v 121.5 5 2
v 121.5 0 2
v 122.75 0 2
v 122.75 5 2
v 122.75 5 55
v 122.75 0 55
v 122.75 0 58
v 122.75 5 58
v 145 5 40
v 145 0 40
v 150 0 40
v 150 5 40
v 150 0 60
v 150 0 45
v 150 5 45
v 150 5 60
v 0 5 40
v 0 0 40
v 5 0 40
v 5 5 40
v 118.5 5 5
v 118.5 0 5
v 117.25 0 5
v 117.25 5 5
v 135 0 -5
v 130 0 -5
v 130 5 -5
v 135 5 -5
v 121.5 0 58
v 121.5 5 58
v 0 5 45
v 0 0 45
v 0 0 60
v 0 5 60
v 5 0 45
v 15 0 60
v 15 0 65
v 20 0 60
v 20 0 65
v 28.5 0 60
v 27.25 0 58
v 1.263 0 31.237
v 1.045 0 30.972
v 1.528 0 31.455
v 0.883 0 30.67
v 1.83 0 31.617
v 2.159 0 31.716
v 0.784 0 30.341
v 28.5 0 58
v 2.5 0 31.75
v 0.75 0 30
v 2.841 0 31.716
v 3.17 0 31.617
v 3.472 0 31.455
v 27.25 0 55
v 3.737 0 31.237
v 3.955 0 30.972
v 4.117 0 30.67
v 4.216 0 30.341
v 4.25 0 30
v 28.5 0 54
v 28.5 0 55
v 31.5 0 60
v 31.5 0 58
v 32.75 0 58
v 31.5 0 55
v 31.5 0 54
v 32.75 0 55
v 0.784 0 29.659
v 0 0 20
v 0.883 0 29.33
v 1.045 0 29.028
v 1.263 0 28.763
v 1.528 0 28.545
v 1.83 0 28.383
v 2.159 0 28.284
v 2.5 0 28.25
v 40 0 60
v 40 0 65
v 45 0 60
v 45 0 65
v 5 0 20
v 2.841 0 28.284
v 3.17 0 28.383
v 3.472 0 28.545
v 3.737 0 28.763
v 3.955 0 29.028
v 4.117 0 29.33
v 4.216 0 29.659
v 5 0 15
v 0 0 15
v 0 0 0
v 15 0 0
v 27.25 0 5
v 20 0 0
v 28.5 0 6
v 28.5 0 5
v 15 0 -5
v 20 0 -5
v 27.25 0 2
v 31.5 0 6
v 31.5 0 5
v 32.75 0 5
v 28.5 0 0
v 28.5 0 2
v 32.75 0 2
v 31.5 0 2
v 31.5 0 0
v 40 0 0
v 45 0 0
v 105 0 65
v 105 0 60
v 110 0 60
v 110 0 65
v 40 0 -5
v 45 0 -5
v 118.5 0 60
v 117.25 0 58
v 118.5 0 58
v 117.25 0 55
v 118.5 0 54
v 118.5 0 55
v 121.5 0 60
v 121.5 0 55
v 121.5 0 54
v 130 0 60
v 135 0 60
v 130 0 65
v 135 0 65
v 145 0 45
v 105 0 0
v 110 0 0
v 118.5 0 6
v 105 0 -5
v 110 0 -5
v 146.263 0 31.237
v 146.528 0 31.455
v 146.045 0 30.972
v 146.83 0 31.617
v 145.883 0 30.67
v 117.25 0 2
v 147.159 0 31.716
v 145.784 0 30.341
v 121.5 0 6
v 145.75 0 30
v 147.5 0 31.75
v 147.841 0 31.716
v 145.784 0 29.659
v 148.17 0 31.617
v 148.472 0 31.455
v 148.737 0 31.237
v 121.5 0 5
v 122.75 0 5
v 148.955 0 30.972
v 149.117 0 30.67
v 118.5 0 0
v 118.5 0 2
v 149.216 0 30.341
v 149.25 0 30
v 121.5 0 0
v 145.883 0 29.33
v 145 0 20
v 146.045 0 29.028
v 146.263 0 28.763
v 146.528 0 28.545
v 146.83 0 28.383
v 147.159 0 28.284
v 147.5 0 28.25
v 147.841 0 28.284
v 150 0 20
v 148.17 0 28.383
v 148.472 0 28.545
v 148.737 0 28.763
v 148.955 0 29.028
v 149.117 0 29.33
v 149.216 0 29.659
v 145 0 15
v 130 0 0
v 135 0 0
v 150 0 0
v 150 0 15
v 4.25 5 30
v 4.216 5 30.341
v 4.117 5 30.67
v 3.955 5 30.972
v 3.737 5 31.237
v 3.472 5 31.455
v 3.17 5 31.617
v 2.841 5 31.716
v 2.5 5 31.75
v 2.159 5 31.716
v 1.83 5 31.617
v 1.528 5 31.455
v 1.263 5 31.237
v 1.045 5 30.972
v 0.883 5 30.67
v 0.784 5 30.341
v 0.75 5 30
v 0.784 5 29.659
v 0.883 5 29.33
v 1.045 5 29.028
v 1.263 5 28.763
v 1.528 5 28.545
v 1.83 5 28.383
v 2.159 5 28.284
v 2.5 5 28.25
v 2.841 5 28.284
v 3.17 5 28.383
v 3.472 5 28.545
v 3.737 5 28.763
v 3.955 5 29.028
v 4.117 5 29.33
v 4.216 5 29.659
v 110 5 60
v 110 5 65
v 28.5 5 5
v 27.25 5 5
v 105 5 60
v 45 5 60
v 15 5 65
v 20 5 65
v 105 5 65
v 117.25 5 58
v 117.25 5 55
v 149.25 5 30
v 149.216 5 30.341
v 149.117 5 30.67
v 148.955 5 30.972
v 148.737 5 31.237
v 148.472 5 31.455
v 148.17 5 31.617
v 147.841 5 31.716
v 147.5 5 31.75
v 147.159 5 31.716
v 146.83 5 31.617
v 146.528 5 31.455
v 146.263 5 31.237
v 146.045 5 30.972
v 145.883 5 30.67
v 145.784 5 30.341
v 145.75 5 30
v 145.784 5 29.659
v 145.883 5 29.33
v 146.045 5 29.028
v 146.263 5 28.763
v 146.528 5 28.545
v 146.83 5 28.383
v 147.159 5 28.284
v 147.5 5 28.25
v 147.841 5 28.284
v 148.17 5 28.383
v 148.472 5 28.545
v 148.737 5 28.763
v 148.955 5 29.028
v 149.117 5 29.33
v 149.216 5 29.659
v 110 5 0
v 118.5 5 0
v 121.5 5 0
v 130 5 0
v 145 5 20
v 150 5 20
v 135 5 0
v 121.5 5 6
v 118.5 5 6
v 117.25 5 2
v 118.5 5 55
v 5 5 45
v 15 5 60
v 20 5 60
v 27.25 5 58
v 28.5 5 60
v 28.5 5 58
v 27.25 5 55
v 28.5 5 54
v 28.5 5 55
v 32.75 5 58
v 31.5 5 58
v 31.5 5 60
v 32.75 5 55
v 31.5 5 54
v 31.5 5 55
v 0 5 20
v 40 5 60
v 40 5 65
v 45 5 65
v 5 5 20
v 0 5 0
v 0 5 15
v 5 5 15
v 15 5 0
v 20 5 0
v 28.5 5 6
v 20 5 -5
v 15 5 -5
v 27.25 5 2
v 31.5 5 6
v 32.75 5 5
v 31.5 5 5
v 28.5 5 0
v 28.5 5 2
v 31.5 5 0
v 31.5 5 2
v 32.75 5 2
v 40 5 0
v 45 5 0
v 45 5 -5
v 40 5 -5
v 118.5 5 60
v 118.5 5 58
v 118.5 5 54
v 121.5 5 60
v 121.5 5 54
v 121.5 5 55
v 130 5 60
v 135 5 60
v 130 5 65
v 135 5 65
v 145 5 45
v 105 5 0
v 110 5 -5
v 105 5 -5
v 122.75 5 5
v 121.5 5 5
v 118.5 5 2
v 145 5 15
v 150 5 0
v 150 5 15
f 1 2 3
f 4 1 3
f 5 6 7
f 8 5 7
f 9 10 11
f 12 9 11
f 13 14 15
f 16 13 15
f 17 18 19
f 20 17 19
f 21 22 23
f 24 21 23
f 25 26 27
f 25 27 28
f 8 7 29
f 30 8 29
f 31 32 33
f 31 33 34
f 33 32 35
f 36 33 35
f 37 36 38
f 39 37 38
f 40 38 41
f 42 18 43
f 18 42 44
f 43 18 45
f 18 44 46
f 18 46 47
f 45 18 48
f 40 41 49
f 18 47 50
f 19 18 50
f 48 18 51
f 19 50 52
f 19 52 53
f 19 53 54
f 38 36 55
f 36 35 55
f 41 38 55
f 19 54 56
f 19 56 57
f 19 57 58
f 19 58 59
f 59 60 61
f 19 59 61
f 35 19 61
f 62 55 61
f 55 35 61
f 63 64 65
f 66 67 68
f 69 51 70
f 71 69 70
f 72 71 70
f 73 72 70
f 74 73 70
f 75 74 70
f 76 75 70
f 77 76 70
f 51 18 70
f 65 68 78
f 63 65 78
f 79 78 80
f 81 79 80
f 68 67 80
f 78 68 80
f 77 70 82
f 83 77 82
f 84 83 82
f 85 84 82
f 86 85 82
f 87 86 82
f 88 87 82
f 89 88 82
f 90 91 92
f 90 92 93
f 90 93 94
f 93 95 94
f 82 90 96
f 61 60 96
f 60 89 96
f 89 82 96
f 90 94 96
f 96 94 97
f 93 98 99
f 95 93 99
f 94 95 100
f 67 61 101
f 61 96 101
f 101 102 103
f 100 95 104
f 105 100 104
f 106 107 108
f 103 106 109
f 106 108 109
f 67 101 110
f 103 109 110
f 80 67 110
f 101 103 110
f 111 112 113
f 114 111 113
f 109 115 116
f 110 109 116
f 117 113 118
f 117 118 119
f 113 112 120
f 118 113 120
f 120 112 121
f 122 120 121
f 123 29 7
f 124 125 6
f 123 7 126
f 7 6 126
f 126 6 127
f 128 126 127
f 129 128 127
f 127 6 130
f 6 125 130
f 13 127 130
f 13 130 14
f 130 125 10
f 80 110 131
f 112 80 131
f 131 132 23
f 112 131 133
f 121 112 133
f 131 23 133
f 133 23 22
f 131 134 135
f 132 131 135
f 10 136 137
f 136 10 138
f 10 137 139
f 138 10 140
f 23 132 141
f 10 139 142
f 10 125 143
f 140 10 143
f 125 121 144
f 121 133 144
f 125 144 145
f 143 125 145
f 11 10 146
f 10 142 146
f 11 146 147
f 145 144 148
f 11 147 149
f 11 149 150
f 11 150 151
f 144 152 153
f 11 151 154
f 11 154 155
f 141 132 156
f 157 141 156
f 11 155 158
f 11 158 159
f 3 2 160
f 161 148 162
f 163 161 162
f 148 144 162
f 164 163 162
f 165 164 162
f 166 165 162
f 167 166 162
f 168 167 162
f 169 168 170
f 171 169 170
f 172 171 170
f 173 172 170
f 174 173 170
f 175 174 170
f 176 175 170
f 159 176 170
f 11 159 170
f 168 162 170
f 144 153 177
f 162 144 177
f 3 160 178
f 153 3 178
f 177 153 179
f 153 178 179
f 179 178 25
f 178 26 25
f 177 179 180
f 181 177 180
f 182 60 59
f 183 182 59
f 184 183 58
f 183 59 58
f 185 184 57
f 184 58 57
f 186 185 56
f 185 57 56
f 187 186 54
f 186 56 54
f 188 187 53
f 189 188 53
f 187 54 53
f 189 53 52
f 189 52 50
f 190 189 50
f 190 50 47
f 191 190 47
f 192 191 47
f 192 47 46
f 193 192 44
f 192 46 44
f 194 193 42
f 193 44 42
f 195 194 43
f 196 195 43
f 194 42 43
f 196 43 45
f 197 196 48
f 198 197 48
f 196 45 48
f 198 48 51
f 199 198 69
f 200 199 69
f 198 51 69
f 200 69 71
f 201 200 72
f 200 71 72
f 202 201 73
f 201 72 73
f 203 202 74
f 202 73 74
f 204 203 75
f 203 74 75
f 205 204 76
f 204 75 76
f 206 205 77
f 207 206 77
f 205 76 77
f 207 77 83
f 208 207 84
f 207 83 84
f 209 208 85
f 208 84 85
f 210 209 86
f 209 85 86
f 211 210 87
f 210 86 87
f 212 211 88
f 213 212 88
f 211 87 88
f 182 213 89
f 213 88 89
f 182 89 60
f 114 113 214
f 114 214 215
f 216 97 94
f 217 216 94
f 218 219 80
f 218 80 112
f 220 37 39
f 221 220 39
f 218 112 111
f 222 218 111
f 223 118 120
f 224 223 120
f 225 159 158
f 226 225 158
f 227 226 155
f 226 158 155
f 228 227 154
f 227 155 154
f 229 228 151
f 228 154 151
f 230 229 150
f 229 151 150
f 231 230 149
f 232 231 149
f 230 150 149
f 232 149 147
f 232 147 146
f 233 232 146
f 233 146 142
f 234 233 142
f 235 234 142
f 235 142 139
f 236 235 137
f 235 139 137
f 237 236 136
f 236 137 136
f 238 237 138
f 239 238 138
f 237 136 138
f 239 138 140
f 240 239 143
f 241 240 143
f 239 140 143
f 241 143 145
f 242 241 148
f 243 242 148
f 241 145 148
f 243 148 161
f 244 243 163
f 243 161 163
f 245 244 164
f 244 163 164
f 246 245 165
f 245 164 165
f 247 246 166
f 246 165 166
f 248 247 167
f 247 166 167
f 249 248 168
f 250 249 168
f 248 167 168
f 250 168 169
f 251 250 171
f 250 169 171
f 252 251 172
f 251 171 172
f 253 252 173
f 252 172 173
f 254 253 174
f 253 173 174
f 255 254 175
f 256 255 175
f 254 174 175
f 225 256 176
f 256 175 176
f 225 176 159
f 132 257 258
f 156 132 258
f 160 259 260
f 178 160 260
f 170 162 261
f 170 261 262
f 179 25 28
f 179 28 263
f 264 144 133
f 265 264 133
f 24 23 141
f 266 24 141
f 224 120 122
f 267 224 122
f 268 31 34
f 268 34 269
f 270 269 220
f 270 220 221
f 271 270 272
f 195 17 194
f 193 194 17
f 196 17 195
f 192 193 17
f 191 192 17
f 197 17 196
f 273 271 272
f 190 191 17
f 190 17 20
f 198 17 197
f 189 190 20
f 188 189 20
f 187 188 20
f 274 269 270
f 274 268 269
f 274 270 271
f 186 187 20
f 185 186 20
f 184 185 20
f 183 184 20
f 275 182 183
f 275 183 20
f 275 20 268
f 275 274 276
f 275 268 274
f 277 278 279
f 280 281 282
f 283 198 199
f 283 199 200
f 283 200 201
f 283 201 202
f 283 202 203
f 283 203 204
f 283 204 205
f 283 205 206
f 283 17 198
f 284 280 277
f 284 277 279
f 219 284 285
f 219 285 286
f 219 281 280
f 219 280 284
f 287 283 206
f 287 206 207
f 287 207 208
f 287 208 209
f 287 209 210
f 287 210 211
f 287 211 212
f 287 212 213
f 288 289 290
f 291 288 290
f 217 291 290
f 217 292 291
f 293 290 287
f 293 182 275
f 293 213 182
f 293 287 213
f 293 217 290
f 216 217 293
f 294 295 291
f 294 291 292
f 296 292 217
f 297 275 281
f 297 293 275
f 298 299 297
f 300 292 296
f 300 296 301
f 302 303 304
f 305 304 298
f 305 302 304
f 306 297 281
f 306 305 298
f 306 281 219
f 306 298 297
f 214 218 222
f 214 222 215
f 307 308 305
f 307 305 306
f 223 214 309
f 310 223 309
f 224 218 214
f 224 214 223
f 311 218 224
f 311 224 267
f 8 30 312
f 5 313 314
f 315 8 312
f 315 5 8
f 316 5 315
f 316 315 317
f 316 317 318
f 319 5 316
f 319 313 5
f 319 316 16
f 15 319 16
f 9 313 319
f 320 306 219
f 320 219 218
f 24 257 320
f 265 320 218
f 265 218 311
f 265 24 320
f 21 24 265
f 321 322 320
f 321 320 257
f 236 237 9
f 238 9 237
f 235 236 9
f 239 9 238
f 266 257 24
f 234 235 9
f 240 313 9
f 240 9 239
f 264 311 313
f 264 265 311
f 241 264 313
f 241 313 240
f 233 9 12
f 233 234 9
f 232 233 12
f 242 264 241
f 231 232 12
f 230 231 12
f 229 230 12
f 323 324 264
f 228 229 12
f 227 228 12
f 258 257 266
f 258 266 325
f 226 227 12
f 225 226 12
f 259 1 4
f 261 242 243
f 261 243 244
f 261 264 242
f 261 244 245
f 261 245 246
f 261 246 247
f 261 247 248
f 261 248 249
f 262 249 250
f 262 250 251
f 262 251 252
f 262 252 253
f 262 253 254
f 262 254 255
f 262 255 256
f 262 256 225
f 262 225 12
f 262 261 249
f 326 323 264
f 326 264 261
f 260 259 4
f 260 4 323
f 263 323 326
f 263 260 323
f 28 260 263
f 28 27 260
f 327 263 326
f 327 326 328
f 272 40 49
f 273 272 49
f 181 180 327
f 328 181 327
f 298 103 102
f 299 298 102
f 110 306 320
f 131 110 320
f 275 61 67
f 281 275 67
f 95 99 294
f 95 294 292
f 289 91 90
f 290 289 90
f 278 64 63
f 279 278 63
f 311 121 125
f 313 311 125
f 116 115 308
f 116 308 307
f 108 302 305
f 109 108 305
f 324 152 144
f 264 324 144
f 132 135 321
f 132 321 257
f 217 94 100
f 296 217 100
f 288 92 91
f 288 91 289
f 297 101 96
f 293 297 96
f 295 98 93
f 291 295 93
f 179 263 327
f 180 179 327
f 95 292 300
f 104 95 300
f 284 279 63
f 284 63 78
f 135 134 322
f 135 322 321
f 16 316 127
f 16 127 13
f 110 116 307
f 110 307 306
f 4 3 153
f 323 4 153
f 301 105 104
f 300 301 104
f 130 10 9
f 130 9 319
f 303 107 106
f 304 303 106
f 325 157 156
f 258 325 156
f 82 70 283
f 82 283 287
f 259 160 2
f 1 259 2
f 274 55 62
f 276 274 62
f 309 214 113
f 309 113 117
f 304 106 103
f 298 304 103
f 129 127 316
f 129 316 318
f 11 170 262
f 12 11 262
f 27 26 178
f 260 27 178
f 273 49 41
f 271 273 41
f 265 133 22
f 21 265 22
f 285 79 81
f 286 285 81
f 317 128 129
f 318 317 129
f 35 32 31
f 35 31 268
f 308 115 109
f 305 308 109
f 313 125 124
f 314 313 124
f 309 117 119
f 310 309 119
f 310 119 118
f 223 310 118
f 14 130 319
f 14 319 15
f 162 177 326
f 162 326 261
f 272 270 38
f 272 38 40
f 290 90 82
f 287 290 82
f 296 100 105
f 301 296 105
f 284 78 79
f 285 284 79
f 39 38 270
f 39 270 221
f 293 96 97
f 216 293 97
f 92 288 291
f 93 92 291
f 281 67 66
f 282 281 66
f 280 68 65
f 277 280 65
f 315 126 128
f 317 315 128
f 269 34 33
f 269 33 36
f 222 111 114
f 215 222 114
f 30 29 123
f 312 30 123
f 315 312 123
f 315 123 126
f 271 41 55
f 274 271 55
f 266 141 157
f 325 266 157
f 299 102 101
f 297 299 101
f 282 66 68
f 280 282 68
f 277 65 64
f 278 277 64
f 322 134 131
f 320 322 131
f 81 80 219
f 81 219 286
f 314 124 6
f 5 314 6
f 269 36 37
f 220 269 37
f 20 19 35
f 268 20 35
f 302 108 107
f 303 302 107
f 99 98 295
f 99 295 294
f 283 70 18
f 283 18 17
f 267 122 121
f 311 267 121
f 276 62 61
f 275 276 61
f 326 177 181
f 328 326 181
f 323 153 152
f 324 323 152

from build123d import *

# Parameters (mm, degrees)
F0_W     = 150
F0_H     = 5
F1_DEPTH = 60
F2_W     = 5
F2_H     = 5
F3_DEPTH = 5
F4_R     = 1.75
F4_W     = 5
F4_H     = 5
F5_DEPTH = 5


with BuildPart() as f1:
    # F0 (on Top) → F1 (new body)
    with BuildSketch(Plane.XY):
        with Locations((75, 2.5)):
            Rectangle(F0_W, F0_H)
    extrude(amount=F1_DEPTH)

    # F2 (on face) → F3 (join, through all)
    with BuildSketch(Plane.XZ):
        with Locations((17.5, -2.5)):
            Rectangle(F2_W, F2_H)
        with Locations((42.5, -2.5)):
            Rectangle(F2_W, F2_H)
        with Locations((107.5, -2.5)):
            Rectangle(F2_W, F2_H)
        with Locations((132.5, -2.5)):
            Rectangle(F2_W, F2_H)
        with Locations((42.5, 62.5)):
            Rectangle(F2_W, F2_H)
        with Locations((17.5, 62.5)):
            Rectangle(F2_W, F2_H)
        with Locations((132.5, 62.5)):
            Rectangle(F2_W, F2_H)
        with Locations((107.5, 62.5)):
            Rectangle(F2_W, F2_H)
    extrude(amount=-F3_DEPTH)

    # F4 (on face) → F5 (cut, through all)
    with BuildSketch(Plane.XZ):
        Polygon((28.5, 2), (28.5, 0), (31.5, 0), (31.5, 2), (32.75, 2), (32.75, 5), (31.5, 5), (31.5, 6), (28.5, 6), (28.5, 5), (27.25, 5), (27.25, 2), align=None)
        Polygon((118.5, 6), (118.5, 5), (117.25, 5), (117.25, 2), (118.5, 2), (118.5, 0), (121.5, 0), (121.5, 2), (122.75, 2), (122.75, 5), (121.5, 5), (121.5, 6), align=None)
        Polygon((121.5, 55), (122.75, 55), (122.75, 58), (121.5, 58), (121.5, 60), (118.5, 60), (118.5, 58), (117.25, 58), (117.25, 55), (118.5, 55), (118.5, 54), (121.5, 54), align=None)
        Polygon((31.5, 54), (31.5, 55), (32.75, 55), (32.75, 58), (31.5, 58), (31.5, 60), (28.5, 60), (28.5, 58), (27.25, 58), (27.25, 55), (28.5, 55), (28.5, 54), align=None)
        with Locations((2.5, 30)):
            Circle(F4_R)
        with Locations((2.5, 42.5)):
            Rectangle(F4_W, F4_H)
        with Locations((2.5, 17.5)):
            Rectangle(F4_W, F4_H)
        with Locations((147.5, 42.5)):
            Rectangle(F4_W, F4_H)
        with Locations((147.5, 30)):
            Circle(F4_R)
        with Locations((147.5, 17.5)):
            Rectangle(F4_W, F4_H)
    extrude(amount=-F5_DEPTH, mode=Mode.SUBTRACT)


solid = f1.part
